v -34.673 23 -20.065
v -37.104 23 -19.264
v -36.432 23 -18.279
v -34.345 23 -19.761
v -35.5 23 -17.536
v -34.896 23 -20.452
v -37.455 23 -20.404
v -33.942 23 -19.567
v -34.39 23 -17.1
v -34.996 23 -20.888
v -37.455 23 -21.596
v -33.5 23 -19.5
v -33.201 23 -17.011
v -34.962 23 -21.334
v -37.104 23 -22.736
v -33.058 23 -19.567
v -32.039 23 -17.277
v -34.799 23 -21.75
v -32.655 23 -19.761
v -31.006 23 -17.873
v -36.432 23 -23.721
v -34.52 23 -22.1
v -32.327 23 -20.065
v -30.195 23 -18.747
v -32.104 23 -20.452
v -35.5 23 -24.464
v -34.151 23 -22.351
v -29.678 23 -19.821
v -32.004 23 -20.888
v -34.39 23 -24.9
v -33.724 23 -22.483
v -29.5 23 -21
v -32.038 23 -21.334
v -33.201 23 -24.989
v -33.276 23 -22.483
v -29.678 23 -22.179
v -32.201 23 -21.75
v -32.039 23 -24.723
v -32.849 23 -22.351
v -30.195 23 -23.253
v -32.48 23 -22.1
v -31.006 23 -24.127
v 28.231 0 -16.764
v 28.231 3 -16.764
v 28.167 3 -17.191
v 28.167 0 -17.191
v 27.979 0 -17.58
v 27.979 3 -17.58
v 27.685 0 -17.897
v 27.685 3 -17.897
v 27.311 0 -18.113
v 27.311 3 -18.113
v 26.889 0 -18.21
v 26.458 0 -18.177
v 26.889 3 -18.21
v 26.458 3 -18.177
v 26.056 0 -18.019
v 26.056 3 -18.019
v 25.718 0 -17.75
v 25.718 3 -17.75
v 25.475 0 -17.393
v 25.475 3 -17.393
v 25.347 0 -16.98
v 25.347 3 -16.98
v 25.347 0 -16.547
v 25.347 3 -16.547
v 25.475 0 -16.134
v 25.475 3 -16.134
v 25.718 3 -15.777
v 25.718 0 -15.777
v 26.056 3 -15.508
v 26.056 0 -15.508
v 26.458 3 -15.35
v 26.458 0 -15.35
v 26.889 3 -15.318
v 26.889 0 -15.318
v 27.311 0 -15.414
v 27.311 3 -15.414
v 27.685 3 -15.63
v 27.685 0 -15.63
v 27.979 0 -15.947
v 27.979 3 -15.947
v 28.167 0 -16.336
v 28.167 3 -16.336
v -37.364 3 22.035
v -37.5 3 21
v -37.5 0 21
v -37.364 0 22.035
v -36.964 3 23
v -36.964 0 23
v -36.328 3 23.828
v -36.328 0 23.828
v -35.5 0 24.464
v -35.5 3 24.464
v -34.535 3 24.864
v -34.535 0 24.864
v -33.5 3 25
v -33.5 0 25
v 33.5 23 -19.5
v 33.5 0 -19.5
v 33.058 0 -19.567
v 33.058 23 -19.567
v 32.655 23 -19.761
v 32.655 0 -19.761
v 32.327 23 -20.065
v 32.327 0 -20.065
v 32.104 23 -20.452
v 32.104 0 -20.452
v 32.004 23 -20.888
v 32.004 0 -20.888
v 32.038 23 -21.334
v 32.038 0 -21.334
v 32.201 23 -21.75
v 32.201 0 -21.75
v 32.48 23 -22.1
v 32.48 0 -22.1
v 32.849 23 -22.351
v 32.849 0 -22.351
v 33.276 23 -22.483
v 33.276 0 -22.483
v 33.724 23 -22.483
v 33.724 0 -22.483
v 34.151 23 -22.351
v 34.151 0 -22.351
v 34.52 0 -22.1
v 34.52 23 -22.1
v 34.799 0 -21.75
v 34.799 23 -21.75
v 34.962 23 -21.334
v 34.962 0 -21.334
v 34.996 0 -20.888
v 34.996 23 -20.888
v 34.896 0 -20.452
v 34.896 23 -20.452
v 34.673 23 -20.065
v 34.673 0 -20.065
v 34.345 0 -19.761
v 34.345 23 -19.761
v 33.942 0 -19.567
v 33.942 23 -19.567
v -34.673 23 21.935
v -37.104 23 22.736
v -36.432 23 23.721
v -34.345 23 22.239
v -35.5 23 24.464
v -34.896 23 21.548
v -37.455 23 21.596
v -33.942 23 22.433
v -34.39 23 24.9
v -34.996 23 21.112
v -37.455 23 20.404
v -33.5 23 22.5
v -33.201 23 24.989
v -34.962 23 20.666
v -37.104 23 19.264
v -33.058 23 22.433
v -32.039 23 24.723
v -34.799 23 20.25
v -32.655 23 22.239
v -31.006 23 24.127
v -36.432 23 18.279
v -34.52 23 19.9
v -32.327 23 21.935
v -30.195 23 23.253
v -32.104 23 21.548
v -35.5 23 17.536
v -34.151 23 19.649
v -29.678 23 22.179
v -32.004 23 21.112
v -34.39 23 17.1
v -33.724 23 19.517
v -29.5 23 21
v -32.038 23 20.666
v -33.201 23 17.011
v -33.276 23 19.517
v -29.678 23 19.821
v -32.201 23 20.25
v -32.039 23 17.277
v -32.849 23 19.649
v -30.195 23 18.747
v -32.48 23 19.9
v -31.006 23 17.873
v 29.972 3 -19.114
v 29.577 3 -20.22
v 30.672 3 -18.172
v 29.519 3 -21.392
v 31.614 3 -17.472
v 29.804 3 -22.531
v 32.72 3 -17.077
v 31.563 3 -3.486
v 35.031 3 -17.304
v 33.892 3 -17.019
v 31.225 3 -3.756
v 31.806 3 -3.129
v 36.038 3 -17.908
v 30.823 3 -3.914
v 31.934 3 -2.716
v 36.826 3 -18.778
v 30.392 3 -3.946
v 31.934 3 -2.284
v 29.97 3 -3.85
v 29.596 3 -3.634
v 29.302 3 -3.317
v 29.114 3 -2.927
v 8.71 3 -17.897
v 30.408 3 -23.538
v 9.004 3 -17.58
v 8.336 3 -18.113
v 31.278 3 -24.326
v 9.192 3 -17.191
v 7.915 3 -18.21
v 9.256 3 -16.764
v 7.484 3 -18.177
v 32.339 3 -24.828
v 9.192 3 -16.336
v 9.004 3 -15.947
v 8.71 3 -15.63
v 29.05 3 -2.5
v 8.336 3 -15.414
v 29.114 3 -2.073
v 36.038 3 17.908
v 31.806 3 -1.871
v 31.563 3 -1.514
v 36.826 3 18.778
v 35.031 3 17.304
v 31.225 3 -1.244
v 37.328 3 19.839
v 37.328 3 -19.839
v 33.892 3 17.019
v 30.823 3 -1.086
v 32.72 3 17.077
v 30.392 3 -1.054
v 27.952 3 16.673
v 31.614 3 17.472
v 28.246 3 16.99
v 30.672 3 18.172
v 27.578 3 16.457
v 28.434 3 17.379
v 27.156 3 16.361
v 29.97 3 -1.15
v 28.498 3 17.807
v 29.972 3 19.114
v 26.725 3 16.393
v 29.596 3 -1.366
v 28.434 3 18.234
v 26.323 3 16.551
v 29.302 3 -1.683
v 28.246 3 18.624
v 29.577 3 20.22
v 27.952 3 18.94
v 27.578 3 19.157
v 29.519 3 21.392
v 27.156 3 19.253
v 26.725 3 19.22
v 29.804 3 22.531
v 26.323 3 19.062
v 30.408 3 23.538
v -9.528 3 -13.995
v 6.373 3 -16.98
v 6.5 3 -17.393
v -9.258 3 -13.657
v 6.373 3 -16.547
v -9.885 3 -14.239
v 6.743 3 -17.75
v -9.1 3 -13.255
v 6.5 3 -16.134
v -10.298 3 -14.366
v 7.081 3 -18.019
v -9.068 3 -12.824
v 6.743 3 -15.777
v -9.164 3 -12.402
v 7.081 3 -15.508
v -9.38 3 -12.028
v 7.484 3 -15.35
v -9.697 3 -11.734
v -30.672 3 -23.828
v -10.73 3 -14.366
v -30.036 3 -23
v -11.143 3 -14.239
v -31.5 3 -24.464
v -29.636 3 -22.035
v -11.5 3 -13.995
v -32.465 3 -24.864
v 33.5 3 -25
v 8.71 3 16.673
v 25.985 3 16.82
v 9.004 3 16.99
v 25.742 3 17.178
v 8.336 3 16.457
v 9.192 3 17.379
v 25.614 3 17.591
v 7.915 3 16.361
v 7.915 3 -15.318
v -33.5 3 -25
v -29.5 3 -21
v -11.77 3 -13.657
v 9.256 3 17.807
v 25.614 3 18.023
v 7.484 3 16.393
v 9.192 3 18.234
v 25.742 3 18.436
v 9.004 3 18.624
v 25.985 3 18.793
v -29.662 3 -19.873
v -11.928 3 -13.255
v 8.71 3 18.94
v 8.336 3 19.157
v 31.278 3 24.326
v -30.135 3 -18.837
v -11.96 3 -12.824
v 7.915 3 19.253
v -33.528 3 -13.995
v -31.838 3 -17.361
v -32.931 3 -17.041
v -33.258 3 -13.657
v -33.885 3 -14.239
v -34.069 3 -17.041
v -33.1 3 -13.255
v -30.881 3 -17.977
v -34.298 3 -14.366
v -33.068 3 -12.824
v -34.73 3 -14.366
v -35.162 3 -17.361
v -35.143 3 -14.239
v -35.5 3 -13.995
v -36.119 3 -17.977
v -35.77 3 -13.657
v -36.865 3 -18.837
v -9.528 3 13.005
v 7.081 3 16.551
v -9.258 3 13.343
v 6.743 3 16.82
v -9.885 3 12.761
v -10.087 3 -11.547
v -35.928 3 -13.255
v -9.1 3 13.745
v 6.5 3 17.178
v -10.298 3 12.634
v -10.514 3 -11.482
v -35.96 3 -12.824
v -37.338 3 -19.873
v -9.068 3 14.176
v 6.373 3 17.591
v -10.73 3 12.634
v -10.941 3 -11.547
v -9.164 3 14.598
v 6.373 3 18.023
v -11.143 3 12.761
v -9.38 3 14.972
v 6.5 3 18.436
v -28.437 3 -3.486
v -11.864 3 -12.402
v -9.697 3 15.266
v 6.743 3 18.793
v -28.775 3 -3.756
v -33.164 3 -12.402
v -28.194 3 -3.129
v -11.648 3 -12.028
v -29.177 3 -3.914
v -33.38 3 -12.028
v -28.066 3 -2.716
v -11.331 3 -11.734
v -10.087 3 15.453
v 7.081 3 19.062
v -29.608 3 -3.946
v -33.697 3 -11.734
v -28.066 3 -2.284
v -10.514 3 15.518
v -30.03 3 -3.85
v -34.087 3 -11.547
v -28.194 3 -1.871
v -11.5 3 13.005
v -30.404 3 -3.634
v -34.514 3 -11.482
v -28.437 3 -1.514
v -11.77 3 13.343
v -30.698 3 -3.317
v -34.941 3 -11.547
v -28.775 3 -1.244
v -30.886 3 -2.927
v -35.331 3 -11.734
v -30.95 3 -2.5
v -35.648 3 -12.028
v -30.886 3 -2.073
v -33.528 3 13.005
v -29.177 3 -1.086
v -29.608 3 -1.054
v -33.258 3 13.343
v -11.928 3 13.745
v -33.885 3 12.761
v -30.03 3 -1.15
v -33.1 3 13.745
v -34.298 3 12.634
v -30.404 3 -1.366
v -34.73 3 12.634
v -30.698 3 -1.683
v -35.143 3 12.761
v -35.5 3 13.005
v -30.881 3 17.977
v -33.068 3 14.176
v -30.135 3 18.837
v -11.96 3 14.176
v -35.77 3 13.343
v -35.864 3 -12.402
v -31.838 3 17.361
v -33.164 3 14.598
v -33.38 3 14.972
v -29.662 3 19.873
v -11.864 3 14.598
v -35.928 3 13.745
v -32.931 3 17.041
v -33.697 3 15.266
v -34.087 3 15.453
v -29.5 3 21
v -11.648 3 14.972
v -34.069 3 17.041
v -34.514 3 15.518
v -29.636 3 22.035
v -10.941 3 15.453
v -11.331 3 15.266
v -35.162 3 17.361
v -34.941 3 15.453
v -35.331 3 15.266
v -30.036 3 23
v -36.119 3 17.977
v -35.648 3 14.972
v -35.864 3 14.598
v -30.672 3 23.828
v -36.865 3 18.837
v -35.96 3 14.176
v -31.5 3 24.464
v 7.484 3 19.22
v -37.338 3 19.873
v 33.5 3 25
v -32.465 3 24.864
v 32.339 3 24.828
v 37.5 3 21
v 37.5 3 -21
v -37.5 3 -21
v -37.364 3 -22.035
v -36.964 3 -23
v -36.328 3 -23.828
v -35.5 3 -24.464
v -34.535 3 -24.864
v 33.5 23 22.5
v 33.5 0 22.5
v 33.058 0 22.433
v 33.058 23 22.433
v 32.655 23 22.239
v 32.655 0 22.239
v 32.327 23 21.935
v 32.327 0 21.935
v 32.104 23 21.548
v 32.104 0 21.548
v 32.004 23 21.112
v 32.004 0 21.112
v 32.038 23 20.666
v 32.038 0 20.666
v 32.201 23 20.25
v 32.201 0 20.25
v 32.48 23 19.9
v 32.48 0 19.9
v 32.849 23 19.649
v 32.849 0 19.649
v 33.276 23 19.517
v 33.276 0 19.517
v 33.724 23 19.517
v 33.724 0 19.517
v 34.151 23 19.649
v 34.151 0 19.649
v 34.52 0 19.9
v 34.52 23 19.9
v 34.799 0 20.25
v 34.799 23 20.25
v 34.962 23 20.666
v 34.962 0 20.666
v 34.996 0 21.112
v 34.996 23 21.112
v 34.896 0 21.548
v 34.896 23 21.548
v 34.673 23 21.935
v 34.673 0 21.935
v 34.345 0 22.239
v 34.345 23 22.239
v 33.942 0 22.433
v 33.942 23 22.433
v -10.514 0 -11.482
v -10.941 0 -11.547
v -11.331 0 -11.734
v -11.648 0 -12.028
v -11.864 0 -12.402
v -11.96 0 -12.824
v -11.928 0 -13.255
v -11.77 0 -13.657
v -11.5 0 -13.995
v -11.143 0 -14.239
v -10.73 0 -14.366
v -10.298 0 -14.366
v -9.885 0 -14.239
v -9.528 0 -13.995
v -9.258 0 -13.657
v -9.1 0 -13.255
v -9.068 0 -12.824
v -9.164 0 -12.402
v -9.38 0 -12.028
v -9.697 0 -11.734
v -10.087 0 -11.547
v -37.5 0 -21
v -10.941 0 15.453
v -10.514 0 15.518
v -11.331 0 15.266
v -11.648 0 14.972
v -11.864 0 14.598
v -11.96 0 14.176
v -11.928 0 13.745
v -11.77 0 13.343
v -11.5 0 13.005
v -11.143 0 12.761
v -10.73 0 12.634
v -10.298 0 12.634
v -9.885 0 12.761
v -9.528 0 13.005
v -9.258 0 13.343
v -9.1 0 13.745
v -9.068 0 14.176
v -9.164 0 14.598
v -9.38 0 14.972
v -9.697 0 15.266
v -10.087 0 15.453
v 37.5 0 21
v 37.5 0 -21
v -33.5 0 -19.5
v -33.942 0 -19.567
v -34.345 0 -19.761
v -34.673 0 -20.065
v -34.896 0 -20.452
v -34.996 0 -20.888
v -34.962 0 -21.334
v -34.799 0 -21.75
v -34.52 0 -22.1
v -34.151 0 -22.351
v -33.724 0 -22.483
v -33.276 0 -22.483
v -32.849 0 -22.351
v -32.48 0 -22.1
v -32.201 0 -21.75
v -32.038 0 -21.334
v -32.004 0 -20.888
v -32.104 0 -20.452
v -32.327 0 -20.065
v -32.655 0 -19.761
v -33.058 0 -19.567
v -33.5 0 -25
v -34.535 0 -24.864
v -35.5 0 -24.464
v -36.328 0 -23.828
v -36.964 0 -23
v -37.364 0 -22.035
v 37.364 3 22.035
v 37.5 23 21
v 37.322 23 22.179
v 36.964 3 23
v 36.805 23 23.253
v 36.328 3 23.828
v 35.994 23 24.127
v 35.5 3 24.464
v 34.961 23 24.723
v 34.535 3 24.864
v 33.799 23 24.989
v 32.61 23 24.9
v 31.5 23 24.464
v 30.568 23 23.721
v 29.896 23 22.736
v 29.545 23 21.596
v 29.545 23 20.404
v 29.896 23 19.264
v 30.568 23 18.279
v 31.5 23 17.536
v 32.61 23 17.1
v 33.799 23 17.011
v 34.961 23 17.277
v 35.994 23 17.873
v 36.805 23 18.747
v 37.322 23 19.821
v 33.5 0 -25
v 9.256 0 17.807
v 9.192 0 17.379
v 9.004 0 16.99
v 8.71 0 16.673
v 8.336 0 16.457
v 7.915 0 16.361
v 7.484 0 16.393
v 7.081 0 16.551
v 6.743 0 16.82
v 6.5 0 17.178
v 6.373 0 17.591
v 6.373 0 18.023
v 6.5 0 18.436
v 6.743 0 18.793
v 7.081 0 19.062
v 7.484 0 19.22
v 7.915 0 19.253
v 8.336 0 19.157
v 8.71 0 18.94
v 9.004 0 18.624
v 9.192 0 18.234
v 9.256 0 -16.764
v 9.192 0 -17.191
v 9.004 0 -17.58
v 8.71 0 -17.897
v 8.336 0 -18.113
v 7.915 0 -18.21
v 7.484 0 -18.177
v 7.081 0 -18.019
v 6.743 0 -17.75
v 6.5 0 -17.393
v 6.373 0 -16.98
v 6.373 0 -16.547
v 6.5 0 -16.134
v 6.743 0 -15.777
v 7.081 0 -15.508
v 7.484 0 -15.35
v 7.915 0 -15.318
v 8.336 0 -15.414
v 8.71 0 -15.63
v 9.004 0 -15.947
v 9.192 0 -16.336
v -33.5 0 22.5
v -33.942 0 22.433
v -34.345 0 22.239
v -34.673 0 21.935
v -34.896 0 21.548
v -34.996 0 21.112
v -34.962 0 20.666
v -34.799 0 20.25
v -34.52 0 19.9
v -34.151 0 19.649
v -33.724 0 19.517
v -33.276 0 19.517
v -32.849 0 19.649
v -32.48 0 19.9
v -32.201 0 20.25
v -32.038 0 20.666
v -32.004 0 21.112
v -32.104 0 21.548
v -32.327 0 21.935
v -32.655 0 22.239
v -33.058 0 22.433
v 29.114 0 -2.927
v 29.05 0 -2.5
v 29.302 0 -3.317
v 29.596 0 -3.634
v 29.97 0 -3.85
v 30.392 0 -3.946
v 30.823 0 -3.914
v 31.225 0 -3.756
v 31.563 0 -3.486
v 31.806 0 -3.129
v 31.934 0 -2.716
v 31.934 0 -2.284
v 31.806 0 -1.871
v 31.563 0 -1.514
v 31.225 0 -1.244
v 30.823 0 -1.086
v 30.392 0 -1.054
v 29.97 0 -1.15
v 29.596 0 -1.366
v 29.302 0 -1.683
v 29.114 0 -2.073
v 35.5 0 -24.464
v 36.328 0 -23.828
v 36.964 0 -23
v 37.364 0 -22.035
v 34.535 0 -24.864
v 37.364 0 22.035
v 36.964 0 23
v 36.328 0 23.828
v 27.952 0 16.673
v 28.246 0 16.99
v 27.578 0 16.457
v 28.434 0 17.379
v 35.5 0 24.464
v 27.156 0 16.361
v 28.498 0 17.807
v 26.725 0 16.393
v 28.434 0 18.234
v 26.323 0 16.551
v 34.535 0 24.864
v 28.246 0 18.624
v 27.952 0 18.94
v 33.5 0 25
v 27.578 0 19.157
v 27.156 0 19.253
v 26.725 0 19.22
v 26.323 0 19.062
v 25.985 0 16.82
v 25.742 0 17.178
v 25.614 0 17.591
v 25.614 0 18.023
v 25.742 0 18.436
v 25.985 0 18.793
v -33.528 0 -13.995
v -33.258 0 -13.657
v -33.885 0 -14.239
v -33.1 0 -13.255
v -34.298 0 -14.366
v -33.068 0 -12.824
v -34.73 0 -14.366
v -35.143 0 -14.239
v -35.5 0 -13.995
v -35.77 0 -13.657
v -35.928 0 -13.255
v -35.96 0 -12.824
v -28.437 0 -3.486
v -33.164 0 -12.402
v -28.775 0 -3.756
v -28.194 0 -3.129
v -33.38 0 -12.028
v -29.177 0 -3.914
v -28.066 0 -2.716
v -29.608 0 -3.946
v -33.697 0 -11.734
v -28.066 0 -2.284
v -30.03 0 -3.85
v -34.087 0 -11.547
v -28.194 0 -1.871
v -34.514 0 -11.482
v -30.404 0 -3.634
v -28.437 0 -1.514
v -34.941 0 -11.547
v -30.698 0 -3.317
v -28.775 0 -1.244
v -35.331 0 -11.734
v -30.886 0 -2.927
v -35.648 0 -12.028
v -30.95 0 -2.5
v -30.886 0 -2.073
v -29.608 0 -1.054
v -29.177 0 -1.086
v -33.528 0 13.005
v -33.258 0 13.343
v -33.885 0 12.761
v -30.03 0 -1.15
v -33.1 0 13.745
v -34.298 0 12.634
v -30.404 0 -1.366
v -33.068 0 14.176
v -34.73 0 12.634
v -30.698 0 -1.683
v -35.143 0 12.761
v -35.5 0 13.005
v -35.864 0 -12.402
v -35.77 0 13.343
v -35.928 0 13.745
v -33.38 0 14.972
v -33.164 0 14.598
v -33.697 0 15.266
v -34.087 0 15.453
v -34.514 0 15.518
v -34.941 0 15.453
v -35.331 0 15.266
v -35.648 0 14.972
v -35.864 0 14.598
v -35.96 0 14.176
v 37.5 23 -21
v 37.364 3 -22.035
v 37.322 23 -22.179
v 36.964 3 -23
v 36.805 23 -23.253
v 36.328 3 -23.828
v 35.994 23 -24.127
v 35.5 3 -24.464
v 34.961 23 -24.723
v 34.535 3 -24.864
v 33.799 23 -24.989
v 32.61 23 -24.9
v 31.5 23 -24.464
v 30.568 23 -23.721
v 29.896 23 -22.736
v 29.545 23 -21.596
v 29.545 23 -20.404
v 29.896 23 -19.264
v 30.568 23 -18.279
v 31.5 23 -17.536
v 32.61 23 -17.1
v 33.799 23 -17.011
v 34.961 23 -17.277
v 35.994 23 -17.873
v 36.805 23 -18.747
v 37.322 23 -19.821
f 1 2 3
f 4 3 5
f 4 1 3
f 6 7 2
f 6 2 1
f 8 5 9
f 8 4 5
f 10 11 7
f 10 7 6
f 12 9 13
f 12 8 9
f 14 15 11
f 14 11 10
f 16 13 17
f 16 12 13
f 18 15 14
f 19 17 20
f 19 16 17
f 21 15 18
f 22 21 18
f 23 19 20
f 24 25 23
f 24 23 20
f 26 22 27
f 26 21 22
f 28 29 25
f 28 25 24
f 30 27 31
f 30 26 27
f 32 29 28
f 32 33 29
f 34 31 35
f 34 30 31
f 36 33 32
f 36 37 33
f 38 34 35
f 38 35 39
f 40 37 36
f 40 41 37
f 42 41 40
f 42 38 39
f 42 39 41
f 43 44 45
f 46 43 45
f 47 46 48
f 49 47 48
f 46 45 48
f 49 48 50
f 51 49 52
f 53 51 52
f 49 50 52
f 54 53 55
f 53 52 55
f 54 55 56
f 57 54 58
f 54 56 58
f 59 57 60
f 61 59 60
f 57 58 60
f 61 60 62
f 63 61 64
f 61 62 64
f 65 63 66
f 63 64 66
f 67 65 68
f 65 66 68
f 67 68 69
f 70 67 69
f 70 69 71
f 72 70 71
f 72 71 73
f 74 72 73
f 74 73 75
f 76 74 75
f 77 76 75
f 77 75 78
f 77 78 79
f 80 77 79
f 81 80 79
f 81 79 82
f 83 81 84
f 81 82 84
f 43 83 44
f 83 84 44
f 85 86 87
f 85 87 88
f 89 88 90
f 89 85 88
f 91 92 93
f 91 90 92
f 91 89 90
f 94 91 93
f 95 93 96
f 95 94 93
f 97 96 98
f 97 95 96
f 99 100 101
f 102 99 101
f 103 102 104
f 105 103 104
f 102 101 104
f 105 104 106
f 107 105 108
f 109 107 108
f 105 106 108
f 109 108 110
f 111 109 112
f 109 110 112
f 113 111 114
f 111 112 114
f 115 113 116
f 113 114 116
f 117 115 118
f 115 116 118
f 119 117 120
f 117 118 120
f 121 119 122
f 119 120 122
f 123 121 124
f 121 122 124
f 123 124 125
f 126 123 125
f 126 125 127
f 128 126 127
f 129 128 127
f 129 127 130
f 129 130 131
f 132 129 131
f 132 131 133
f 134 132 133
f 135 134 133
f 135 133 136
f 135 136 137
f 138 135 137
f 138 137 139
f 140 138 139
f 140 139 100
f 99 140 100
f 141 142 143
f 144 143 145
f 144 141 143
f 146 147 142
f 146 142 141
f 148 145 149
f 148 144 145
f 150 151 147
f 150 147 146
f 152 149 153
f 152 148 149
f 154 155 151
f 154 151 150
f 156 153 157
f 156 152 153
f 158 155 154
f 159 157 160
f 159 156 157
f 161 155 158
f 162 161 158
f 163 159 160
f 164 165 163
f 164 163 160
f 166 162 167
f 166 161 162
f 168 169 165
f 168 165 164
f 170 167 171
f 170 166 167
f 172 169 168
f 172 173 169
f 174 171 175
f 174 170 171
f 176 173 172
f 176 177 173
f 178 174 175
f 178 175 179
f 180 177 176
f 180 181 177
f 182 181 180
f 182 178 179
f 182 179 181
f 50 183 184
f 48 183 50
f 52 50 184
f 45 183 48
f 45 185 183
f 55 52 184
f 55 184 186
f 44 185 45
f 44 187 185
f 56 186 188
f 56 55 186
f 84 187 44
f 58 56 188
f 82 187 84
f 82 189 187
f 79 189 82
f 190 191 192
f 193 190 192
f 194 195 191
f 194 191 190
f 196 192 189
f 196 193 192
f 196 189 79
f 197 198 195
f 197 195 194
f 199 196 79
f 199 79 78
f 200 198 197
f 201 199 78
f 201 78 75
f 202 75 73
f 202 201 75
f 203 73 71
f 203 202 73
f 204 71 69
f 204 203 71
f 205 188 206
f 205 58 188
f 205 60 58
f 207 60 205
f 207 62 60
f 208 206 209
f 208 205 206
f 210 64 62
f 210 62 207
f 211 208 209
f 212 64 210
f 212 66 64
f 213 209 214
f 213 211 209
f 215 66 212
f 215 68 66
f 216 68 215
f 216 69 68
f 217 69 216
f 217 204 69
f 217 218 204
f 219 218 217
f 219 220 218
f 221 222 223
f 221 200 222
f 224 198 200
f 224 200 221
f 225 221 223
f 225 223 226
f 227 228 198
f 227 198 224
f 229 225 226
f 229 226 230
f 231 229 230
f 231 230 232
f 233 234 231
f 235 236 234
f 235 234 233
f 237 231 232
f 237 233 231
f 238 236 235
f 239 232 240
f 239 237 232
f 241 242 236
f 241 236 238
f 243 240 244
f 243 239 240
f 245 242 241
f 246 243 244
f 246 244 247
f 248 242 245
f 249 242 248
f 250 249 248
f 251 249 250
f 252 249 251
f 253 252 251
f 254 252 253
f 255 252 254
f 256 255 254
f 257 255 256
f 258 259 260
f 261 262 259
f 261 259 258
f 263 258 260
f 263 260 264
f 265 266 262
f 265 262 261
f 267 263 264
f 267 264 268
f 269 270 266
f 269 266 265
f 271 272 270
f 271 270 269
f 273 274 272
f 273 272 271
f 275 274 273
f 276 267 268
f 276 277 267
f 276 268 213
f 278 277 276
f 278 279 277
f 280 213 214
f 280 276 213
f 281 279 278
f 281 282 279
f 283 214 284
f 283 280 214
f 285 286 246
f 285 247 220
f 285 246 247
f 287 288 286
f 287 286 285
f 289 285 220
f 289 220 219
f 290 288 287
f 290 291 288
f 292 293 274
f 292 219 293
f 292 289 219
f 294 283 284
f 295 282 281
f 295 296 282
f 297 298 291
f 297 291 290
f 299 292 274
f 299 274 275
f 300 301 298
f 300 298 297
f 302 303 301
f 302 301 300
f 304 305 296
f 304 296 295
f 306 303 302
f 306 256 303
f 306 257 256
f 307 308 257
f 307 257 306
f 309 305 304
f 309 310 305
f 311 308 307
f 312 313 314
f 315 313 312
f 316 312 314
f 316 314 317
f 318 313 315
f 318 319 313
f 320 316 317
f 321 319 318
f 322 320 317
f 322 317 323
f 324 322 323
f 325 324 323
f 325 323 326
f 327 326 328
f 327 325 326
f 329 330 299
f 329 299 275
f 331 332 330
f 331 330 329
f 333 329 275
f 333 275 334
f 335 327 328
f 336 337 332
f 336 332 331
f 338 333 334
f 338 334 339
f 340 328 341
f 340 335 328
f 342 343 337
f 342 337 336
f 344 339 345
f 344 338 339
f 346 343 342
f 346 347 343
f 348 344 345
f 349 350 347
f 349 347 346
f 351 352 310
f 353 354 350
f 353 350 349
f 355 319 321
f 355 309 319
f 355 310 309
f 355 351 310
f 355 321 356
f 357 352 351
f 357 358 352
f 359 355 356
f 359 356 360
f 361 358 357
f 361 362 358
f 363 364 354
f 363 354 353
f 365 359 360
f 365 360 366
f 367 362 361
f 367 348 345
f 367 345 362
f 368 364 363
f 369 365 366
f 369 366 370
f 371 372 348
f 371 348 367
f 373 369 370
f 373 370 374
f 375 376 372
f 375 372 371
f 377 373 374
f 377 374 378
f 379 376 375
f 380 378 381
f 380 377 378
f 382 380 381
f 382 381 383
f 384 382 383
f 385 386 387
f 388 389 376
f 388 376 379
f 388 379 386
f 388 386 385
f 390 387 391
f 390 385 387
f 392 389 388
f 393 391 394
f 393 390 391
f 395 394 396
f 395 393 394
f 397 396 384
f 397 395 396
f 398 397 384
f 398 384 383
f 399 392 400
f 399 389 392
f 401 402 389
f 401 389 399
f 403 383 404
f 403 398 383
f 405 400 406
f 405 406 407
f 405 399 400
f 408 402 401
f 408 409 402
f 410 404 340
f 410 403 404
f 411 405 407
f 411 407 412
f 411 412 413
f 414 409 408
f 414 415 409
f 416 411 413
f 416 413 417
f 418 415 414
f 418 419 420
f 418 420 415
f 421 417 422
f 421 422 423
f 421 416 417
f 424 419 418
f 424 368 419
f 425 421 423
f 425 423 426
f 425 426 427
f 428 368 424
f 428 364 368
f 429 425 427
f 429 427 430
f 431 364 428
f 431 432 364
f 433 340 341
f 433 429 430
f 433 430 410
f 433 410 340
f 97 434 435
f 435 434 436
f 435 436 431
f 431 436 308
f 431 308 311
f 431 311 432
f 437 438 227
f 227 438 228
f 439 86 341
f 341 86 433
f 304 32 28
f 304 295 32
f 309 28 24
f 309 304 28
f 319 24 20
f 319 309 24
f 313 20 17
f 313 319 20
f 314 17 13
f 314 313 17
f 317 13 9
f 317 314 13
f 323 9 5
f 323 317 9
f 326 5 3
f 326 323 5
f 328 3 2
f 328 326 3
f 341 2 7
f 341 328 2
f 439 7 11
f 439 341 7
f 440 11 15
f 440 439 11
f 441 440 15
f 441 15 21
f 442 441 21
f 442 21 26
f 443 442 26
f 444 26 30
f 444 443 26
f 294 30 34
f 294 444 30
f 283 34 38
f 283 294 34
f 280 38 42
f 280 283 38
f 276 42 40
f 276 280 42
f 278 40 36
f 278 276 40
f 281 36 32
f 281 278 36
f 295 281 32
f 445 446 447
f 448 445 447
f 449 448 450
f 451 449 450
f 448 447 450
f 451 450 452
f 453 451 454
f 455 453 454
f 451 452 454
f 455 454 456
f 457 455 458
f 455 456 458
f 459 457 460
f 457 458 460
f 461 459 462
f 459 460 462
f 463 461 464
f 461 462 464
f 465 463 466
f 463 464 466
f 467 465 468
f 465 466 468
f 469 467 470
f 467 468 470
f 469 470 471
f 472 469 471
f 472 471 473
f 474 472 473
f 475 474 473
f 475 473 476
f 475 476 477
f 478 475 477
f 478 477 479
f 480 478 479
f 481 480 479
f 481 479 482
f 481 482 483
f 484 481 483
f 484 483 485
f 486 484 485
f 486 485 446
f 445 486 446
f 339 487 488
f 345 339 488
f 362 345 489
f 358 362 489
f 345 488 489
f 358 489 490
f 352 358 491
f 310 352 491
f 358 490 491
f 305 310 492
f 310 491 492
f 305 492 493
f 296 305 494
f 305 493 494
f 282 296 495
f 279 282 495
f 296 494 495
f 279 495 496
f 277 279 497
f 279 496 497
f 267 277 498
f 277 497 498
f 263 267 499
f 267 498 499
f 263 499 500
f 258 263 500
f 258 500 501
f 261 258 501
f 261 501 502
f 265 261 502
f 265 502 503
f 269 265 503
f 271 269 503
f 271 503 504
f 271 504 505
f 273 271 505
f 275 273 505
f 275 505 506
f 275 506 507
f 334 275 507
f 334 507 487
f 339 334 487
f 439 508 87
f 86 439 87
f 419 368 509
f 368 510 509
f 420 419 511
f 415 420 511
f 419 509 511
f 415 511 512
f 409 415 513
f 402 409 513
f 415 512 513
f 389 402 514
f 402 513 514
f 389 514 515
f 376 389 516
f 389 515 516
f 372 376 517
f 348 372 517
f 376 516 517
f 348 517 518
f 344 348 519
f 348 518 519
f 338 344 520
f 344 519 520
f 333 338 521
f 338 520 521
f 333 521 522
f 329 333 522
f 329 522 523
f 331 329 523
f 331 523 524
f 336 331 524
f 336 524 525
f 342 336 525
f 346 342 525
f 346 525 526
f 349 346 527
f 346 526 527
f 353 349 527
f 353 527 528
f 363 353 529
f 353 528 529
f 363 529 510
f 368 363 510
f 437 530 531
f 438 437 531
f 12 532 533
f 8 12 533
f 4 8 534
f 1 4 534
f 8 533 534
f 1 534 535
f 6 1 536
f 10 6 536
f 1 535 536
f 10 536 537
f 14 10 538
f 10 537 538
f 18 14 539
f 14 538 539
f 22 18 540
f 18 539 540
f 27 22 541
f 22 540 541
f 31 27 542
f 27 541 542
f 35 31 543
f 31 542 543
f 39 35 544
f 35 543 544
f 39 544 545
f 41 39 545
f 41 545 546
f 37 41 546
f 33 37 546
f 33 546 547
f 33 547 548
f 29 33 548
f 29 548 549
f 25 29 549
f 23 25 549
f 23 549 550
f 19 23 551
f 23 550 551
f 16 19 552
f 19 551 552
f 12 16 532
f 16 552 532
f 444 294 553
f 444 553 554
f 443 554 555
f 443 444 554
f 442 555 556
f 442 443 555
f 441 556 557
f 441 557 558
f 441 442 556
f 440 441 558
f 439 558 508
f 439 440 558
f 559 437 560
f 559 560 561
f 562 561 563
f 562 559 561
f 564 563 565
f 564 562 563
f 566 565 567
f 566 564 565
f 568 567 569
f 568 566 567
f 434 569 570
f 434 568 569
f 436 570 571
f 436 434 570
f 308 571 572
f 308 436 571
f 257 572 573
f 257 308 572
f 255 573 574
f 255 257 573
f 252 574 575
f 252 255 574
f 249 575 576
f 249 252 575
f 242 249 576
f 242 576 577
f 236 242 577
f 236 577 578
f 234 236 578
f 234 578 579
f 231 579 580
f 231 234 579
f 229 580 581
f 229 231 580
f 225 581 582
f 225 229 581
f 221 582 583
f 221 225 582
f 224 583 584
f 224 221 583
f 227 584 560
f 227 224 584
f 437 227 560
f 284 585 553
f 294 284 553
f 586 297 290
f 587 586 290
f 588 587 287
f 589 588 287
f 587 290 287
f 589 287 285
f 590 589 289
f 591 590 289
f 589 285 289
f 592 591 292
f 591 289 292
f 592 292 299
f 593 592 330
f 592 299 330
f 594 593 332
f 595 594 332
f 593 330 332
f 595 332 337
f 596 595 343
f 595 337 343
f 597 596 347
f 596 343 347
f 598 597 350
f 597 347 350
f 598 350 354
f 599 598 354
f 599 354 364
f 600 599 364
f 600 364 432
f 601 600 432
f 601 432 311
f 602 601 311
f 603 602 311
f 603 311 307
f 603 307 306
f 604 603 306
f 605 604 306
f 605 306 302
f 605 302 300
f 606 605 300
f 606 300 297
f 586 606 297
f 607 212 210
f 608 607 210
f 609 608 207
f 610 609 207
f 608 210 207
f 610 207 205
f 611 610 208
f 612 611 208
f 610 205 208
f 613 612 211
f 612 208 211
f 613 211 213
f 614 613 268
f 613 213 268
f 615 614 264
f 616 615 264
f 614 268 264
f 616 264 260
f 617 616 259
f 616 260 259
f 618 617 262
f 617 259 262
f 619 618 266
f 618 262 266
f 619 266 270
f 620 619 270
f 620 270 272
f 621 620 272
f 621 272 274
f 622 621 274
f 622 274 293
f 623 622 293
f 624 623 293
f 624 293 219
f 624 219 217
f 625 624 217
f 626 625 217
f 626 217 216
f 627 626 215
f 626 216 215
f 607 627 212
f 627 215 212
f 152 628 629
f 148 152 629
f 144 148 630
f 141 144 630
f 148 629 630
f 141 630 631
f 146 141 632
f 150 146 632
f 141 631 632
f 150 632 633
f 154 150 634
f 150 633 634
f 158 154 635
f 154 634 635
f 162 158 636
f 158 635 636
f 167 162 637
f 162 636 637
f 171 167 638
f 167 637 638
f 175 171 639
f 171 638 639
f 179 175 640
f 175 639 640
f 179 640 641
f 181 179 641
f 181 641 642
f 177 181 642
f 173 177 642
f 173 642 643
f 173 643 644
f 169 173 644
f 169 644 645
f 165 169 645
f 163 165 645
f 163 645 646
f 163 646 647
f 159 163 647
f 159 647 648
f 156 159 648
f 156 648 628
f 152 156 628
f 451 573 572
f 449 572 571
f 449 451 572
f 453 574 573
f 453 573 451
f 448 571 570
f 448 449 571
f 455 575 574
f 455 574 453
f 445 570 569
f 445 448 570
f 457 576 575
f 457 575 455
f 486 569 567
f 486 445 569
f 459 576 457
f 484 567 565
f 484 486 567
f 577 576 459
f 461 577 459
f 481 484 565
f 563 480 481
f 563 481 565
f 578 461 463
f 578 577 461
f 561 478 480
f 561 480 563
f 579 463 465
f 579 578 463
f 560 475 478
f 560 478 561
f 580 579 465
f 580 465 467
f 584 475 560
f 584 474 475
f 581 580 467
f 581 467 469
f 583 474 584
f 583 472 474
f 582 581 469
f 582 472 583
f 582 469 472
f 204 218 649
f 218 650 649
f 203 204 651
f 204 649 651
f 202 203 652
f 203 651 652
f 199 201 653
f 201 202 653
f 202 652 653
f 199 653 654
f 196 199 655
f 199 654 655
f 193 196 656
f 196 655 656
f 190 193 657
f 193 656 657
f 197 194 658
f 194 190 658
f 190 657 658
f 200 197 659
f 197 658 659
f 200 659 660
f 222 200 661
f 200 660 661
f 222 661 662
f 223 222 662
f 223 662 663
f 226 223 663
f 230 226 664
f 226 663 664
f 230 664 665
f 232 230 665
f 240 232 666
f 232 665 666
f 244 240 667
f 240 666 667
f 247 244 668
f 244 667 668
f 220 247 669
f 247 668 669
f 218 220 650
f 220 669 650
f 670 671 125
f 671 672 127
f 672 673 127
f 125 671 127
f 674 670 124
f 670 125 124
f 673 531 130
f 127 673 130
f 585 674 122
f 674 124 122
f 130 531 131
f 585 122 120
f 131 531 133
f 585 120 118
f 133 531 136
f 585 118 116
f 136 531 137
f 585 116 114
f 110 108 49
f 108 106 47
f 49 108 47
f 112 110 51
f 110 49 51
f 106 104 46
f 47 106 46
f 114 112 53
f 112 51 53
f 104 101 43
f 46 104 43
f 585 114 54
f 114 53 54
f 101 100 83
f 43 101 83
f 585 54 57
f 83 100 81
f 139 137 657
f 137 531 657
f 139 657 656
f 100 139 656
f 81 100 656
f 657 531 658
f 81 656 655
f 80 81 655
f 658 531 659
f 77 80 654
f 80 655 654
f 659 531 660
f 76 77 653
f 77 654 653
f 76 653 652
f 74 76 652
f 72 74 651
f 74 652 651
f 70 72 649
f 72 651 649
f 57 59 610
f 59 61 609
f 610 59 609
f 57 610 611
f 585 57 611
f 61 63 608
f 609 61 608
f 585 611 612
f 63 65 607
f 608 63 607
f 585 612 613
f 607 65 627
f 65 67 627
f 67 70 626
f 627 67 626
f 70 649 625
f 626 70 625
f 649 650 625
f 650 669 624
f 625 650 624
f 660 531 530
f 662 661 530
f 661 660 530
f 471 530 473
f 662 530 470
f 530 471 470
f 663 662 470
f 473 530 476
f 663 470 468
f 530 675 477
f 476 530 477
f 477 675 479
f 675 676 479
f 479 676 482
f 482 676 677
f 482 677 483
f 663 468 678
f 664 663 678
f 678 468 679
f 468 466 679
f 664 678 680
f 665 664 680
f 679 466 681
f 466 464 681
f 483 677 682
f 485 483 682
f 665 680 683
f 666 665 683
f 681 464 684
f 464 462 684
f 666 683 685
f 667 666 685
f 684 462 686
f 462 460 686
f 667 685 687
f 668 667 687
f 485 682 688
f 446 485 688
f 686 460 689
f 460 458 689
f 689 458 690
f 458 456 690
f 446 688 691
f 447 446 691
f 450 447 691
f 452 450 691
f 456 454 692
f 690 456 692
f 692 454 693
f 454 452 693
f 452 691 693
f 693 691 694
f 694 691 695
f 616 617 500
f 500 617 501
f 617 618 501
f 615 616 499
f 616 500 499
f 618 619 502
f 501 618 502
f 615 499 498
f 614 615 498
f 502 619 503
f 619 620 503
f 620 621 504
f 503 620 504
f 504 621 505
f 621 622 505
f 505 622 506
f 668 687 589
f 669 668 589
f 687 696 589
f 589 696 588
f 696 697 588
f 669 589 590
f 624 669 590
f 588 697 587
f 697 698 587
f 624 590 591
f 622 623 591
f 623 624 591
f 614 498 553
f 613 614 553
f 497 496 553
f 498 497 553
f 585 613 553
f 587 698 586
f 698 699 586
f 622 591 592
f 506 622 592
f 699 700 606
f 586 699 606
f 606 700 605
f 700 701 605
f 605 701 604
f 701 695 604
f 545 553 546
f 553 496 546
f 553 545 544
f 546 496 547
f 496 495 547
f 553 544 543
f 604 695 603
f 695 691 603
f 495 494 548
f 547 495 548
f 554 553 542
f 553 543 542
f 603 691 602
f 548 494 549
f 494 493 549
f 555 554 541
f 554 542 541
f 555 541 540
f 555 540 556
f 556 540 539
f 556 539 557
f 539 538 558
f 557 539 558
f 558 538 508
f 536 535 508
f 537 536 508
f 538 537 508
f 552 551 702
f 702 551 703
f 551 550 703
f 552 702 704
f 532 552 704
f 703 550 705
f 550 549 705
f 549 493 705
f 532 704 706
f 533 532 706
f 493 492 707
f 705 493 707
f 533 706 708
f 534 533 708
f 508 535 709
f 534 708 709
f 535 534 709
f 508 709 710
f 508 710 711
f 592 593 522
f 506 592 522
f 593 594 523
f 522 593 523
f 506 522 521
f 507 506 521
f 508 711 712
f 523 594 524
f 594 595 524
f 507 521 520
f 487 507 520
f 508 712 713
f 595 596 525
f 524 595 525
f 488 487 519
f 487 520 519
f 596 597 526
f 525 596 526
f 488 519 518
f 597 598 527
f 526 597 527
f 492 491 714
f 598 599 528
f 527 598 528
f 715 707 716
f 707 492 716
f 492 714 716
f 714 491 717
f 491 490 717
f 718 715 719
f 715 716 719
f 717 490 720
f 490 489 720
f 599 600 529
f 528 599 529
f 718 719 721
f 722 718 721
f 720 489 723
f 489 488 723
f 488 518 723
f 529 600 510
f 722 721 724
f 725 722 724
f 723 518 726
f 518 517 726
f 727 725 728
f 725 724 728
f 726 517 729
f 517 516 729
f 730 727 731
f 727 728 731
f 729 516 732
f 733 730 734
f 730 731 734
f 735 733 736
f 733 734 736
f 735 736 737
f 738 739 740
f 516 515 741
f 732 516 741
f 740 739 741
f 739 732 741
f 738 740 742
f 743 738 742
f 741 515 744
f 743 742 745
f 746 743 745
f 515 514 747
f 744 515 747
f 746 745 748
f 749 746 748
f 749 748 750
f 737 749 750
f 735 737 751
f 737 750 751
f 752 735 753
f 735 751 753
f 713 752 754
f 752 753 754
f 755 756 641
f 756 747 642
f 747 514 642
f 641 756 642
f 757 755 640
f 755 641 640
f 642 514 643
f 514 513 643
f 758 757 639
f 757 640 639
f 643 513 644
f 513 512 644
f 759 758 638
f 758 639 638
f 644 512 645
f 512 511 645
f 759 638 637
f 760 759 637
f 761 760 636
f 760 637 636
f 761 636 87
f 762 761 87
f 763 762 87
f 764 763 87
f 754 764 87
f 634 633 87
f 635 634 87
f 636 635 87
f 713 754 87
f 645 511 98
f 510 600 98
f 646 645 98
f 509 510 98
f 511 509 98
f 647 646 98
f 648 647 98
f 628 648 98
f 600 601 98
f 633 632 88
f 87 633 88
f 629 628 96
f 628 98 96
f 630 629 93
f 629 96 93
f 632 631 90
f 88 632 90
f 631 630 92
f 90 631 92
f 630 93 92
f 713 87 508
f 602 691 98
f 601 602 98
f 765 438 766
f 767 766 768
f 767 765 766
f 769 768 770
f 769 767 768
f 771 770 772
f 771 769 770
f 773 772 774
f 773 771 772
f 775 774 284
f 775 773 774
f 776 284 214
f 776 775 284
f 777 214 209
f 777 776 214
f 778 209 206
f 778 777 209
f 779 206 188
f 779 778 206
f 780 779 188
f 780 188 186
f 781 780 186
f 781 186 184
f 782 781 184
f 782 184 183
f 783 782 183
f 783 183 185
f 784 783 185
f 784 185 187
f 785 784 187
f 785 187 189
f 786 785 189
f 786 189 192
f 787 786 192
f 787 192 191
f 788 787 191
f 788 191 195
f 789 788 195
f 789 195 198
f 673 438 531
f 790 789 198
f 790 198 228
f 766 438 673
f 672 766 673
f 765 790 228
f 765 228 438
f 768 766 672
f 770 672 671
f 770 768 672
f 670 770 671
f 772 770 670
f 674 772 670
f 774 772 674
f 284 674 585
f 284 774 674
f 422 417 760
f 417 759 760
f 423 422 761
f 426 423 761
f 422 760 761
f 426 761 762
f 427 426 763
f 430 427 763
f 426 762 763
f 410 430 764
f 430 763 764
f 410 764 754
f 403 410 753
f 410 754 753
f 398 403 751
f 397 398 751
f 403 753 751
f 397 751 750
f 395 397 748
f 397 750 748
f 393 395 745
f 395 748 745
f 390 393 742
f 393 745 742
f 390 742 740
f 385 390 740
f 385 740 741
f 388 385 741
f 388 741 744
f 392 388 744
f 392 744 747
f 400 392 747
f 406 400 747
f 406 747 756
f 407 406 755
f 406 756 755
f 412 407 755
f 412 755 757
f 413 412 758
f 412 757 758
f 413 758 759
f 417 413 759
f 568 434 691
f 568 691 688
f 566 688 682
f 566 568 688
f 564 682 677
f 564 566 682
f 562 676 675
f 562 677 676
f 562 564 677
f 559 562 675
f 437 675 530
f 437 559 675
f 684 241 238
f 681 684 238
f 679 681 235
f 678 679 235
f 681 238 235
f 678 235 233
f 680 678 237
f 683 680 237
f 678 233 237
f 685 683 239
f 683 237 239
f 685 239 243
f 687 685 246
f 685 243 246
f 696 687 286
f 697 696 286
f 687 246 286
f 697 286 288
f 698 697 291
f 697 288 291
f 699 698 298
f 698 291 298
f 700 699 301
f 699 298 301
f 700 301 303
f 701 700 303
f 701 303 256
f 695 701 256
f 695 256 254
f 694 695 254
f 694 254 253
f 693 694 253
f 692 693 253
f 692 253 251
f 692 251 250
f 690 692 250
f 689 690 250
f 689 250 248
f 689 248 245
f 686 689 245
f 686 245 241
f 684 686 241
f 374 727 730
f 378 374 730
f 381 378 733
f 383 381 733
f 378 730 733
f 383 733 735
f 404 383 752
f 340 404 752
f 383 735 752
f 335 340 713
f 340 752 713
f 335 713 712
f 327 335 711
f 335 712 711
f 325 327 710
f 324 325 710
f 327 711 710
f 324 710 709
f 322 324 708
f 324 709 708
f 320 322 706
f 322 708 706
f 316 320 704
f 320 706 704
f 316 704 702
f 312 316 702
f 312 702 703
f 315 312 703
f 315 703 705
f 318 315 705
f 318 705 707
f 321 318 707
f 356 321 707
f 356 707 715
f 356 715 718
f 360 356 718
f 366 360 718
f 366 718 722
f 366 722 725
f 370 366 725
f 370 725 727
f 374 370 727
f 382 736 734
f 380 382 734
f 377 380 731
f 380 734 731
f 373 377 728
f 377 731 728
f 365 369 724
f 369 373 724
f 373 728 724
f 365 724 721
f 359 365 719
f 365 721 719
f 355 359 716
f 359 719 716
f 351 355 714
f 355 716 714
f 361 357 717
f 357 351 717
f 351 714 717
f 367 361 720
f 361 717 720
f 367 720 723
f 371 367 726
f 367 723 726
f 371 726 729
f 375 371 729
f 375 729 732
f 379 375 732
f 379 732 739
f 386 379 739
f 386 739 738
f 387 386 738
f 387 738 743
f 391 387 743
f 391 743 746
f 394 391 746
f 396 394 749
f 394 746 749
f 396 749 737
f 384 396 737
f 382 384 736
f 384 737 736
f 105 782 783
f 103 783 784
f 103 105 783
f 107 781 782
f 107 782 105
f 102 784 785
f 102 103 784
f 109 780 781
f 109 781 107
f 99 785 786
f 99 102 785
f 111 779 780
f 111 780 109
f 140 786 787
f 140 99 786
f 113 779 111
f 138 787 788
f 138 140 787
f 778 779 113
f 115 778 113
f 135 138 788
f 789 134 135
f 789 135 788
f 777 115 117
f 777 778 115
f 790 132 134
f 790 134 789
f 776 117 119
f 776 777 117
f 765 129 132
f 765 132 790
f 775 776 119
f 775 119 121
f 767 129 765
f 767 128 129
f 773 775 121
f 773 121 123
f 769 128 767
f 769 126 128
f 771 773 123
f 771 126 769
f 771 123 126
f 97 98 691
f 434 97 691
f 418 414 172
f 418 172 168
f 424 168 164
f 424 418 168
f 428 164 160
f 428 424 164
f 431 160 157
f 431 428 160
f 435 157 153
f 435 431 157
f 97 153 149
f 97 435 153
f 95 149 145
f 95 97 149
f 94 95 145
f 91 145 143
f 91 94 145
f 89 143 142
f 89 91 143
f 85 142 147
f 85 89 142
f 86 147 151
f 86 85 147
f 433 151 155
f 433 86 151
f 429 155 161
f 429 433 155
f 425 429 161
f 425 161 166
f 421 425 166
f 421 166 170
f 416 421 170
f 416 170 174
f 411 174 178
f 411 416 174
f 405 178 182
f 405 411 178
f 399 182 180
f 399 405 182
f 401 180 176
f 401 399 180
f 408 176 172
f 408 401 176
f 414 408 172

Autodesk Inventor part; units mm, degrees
ref_plane "YZ Plane" through (0, 0, 0) normal (1, 0, 0) x (0, 1, 0)
ref_plane "XZ Plane" through (0, 0, 0) normal (0, 1, 0) x (-1, 0, 0)
ref_plane "XY Plane" through (0, 0, 0) normal (0, 0, 1) x (1, 0, 0)
sketch "Sketch1" plane through (0, 0, 0) normal (0, 1, 0) x (-1, 0, 0)
  line L0 (37.5, 25) -> (-37.5, 25)
  line L1 (-37.5, 25) -> (-37.5, -25)
  line L2 (-37.5, -25) -> (37.5, -25)
  line L3 (37.5, -25) -> (37.5, 25)
  line L4 (37.5, 25) -> (-37.5, -25) construction
  line L5 (-37.5, 25) -> (37.5, -25) construction
  circle A0 centre (29.5, -0.5) radius 2 construction
  circle A1 centre (-30.5, -0.5) radius 2 construction
  circle A2 centre (29.5, -2.5) radius 1.45
  circle A3 centre (-30.5, -2.5) radius 1.45
  point P0 (0, 0)
  dimension "d0" = 75
  dimension "d1" = 50
  dimension "d9" = 2.9
  dimension "d10" = 2.9
sketch "Sketch1 outline for Extrusion1" plane through (0, 0, 0) normal (0, 1, 0) x (-1, 0, 0)
  line L0 (37.5, -25) -> (37.5, 25)
  line L1 (-37.5, -25) -> (37.5, -25)
  line L2 (37.5, 25) -> (-37.5, 25)
  line L3 (-37.5, 25) -> (-37.5, -25)
  circle A0 centre (29.5, -2.5) radius 1.45
  circle A1 centre (-30.5, -2.5) radius 1.45
extrude "Extrusion1" add sketch "Sketch1 outline for Extrusion1" along normal blind 3
fillet "Fillet1" radius 4 4 edges at (-37.5, 1.5, 25) (37.5, 1.5, 25) (37.5, 1.5, -25) (-37.5, 1.5, -25)
sketch "Sketch2" plane through (0, 3, 0) normal (0, 1, 0) x (1, 0, 0)
  arc A0 (-33.5, 25) -> (-37.5, 21) centre (-33.5, 21) ccw projected
  line L0 (-37.5, 21) -> (-37.5, -21) projected
  arc A1 (-37.5, -21) -> (-33.5, -25) centre (-33.5, -21) ccw projected
  line L1 (-33.5, -25) -> (33.5, -25) projected
  arc A2 (33.5, -25) -> (37.5, -21) centre (33.5, -21) ccw projected
  line L2 (37.5, -21) -> (37.5, 21) projected
  arc A3 (37.5, 21) -> (33.5, 25) centre (33.5, 21) ccw projected
  line L3 (33.5, 25) -> (-33.5, 25) projected
  circle A4 centre (-33.5, -21) radius 4
  circle A5 centre (-33.5, 21) radius 4
  circle A6 centre (33.5, 21) radius 4
  circle A7 centre (33.5, -21) radius 4
  point P0 (0, 0)
sketch "Sketch2 outline for Extrusion2" plane through (0, 3, 0) normal (0, 1, 0) x (1, 0, 0)
  circle A0 centre (-33.5, -21) radius 4
  circle A1 centre (-33.5, 21) radius 4
  circle A2 centre (33.5, 21) radius 4
  circle A3 centre (33.5, -21) radius 4
extrude "Extrusion2" add sketch "Sketch2 outline for Extrusion2" along normal blind 20
sketch "Sketch3" plane through (-33.5, 23, -21) normal (0, 1, 0) x (1, 0, 0)
  circle A0 centre (0, 0) radius 4 projected
  circle A1 centre (67, 0) radius 4 projected
  circle A2 centre (67, -42) radius 4 projected
  circle A3 centre (0, -42) radius 4 projected
  point P0 (33.5, -21)
hole "Hole1" at (33.5, 23, -21) at (33.5, 23, 21) at (-33.5, 23, 21) at (-33.5, 23, -21) direction (0, -1, 0) diameter 3 end through all
sketch "Sketch4" plane through (0, 3, 0) normal (0, 1, 0) x (1, 0, 0)
  circle A0 centre (-34.514046, 12.932135) radius 1
  circle A1 centre (-10.514046, -14.067865) radius 1
  circle A2 centre (-34.514046, -14.067865) radius 1
  circle A3 centre (-34.514046, 12.932135) radius 1
  circle A4 centre (-10.514046, 12.932135) radius 1
  line L0 (-9.014046, -15.567865) -> (-9.014046, 14.432135)
  line L1 (-9.014046, 14.432135) -> (-36.014046, 14.432135)
  line L2 (-36.014046, 14.432135) -> (-36.014046, -15.567865)
  line L3 (-36.014046, -15.567865) -> (-9.014046, -15.567865)
  point P0 (0, 0)
hole "Hole2" at (-10.514046, 3, -12.932135) at (-10.514046, 3, 14.067865) at (-34.514046, 3, 14.067865) at (-34.514046, 3, -12.932135) direction (0, -1, 0) diameter 2.9 end through all
sketch "Sketch5" plane through (0, 3, 0) normal (0, 1, 0) x (1, 0, 0)
  circle A0 centre (29.048004, -12.336543) radius 0.5
  circle A1 centre (27.048004, -12.336543) radius 0.5
  circle A2 centre (25.048004, -12.336543) radius 0.5
  circle A3 centre (23.048004, -12.336543) radius 0.5
  circle A4 centre (21.048004, -12.336543) radius 0.5
  circle A5 centre (19.048004, -12.336543) radius 0.5
  circle A6 centre (17.048004, -12.336543) radius 0.5
  circle A7 centre (15.048004, -12.336543) radius 0.5
  circle A8 centre (13.048004, -12.336543) radius 0.5
  circle A9 centre (11.048004, -12.336543) radius 0.5
  circle A10 centre (29.048004, -14.336543) radius 0.5
  circle A11 centre (27.048004, -14.336543) radius 0.5
  circle A12 centre (25.048004, -14.336543) radius 0.5
  circle A13 centre (23.048004, -14.336543) radius 0.5
  circle A14 centre (21.048004, -14.336543) radius 0.5
  circle A15 centre (19.048004, -14.336543) radius 0.5
  circle A16 centre (17.048004, -14.336543) radius 0.5
  circle A17 centre (15.048004, -14.336543) radius 0.5
  circle A18 centre (13.048004, -14.336543) radius 0.5
  circle A19 centre (11.048004, -14.336543) radius 0.5
  line L0 (36.448004, 3.863457) -> (40.048004, 3.863457)
  line L1 (40.048004, 3.863457) -> (40.048004, 4.163457)
  line L2 (40.048004, 4.163457) -> (42.048004, 4.163457)
  line L3 (42.048004, 4.163457) -> (42.048004, 15.163457)
  line L4 (42.048004, 15.163457) -> (5.048004, 15.163457)
  line L5 (5.048004, 15.163457) -> (3.048004, 13.163457)
  line L6 (3.048004, 13.163457) -> (3.048004, -14.036543)
  line L7 (3.048004, -14.036543) -> (5.048004, -16.036543)
  line L8 (5.048004, -16.036543) -> (35.748004, -16.036543)
  line L9 (35.748004, -16.036543) -> (35.748004, -13.436543)
  line L10 (35.748004, -13.436543) -> (36.448004, -13.436543)
  line L11 (36.448004, -13.436543) -> (36.448004, -11.381199)
  line L12 (36.448004, -11.381199) -> (41.474904, -11.381199)
  line L13 (41.474904, -11.381199) -> (41.474904, -13.436543)
  line L14 (41.474904, -13.436543) -> (42.048004, -13.436543)
  line L15 (42.048004, -13.436543) -> (42.048004, -5.136543)
  line L16 (42.048004, -5.136543) -> (40.048004, -5.136543)
  line L17 (40.048004, -5.136543) -> (40.048004, -4.336543)
  line L18 (40.048004, -4.336543) -> (36.448004, -4.336543)
  line L19 (36.448004, -4.336543) -> (36.448004, 3.863457)
  line L20 (10.248004, -8.436543) -> (10.248004, 7.063457)
  line L21 (10.248004, 7.063457) -> (27.748004, 7.063457)
  line L22 (27.748004, 7.063457) -> (27.748004, -8.436543)
  line L23 (27.748004, -8.436543) -> (10.248004, -8.436543)
  circle A20 centre (27.048004, -17.806741) radius 1.45
  circle A21 centre (7.806396, -17.806741) radius 1.45
  circle A22 centre (7.806396, 16.763599) radius 1.45
  circle A23 centre (26.781094, 16.763599) radius 1.45
  point P0 (0, 0)
  dimension "d25" = 2.9
  dimension "d26" = 2.9
  dimension "d27" = 2.9
  dimension "d28" = 2.9
sketch "Sketch5 outline for Extrusion3" plane through (0, 3, 0) normal (0, 1, 0) x (1, 0, 0)
  circle A0 centre (27.048004, -17.806741) radius 1.45
  circle A1 centre (7.806396, -17.806741) radius 1.45
  circle A2 centre (7.806396, 16.763599) radius 1.45
  circle A3 centre (26.781094, 16.763599) radius 1.45
extrude "Extrusion3" cut sketch "Sketch5 outline for Extrusion3" against normal blind 15
properties part number "cellSTORM_v5_miniElectronics"
